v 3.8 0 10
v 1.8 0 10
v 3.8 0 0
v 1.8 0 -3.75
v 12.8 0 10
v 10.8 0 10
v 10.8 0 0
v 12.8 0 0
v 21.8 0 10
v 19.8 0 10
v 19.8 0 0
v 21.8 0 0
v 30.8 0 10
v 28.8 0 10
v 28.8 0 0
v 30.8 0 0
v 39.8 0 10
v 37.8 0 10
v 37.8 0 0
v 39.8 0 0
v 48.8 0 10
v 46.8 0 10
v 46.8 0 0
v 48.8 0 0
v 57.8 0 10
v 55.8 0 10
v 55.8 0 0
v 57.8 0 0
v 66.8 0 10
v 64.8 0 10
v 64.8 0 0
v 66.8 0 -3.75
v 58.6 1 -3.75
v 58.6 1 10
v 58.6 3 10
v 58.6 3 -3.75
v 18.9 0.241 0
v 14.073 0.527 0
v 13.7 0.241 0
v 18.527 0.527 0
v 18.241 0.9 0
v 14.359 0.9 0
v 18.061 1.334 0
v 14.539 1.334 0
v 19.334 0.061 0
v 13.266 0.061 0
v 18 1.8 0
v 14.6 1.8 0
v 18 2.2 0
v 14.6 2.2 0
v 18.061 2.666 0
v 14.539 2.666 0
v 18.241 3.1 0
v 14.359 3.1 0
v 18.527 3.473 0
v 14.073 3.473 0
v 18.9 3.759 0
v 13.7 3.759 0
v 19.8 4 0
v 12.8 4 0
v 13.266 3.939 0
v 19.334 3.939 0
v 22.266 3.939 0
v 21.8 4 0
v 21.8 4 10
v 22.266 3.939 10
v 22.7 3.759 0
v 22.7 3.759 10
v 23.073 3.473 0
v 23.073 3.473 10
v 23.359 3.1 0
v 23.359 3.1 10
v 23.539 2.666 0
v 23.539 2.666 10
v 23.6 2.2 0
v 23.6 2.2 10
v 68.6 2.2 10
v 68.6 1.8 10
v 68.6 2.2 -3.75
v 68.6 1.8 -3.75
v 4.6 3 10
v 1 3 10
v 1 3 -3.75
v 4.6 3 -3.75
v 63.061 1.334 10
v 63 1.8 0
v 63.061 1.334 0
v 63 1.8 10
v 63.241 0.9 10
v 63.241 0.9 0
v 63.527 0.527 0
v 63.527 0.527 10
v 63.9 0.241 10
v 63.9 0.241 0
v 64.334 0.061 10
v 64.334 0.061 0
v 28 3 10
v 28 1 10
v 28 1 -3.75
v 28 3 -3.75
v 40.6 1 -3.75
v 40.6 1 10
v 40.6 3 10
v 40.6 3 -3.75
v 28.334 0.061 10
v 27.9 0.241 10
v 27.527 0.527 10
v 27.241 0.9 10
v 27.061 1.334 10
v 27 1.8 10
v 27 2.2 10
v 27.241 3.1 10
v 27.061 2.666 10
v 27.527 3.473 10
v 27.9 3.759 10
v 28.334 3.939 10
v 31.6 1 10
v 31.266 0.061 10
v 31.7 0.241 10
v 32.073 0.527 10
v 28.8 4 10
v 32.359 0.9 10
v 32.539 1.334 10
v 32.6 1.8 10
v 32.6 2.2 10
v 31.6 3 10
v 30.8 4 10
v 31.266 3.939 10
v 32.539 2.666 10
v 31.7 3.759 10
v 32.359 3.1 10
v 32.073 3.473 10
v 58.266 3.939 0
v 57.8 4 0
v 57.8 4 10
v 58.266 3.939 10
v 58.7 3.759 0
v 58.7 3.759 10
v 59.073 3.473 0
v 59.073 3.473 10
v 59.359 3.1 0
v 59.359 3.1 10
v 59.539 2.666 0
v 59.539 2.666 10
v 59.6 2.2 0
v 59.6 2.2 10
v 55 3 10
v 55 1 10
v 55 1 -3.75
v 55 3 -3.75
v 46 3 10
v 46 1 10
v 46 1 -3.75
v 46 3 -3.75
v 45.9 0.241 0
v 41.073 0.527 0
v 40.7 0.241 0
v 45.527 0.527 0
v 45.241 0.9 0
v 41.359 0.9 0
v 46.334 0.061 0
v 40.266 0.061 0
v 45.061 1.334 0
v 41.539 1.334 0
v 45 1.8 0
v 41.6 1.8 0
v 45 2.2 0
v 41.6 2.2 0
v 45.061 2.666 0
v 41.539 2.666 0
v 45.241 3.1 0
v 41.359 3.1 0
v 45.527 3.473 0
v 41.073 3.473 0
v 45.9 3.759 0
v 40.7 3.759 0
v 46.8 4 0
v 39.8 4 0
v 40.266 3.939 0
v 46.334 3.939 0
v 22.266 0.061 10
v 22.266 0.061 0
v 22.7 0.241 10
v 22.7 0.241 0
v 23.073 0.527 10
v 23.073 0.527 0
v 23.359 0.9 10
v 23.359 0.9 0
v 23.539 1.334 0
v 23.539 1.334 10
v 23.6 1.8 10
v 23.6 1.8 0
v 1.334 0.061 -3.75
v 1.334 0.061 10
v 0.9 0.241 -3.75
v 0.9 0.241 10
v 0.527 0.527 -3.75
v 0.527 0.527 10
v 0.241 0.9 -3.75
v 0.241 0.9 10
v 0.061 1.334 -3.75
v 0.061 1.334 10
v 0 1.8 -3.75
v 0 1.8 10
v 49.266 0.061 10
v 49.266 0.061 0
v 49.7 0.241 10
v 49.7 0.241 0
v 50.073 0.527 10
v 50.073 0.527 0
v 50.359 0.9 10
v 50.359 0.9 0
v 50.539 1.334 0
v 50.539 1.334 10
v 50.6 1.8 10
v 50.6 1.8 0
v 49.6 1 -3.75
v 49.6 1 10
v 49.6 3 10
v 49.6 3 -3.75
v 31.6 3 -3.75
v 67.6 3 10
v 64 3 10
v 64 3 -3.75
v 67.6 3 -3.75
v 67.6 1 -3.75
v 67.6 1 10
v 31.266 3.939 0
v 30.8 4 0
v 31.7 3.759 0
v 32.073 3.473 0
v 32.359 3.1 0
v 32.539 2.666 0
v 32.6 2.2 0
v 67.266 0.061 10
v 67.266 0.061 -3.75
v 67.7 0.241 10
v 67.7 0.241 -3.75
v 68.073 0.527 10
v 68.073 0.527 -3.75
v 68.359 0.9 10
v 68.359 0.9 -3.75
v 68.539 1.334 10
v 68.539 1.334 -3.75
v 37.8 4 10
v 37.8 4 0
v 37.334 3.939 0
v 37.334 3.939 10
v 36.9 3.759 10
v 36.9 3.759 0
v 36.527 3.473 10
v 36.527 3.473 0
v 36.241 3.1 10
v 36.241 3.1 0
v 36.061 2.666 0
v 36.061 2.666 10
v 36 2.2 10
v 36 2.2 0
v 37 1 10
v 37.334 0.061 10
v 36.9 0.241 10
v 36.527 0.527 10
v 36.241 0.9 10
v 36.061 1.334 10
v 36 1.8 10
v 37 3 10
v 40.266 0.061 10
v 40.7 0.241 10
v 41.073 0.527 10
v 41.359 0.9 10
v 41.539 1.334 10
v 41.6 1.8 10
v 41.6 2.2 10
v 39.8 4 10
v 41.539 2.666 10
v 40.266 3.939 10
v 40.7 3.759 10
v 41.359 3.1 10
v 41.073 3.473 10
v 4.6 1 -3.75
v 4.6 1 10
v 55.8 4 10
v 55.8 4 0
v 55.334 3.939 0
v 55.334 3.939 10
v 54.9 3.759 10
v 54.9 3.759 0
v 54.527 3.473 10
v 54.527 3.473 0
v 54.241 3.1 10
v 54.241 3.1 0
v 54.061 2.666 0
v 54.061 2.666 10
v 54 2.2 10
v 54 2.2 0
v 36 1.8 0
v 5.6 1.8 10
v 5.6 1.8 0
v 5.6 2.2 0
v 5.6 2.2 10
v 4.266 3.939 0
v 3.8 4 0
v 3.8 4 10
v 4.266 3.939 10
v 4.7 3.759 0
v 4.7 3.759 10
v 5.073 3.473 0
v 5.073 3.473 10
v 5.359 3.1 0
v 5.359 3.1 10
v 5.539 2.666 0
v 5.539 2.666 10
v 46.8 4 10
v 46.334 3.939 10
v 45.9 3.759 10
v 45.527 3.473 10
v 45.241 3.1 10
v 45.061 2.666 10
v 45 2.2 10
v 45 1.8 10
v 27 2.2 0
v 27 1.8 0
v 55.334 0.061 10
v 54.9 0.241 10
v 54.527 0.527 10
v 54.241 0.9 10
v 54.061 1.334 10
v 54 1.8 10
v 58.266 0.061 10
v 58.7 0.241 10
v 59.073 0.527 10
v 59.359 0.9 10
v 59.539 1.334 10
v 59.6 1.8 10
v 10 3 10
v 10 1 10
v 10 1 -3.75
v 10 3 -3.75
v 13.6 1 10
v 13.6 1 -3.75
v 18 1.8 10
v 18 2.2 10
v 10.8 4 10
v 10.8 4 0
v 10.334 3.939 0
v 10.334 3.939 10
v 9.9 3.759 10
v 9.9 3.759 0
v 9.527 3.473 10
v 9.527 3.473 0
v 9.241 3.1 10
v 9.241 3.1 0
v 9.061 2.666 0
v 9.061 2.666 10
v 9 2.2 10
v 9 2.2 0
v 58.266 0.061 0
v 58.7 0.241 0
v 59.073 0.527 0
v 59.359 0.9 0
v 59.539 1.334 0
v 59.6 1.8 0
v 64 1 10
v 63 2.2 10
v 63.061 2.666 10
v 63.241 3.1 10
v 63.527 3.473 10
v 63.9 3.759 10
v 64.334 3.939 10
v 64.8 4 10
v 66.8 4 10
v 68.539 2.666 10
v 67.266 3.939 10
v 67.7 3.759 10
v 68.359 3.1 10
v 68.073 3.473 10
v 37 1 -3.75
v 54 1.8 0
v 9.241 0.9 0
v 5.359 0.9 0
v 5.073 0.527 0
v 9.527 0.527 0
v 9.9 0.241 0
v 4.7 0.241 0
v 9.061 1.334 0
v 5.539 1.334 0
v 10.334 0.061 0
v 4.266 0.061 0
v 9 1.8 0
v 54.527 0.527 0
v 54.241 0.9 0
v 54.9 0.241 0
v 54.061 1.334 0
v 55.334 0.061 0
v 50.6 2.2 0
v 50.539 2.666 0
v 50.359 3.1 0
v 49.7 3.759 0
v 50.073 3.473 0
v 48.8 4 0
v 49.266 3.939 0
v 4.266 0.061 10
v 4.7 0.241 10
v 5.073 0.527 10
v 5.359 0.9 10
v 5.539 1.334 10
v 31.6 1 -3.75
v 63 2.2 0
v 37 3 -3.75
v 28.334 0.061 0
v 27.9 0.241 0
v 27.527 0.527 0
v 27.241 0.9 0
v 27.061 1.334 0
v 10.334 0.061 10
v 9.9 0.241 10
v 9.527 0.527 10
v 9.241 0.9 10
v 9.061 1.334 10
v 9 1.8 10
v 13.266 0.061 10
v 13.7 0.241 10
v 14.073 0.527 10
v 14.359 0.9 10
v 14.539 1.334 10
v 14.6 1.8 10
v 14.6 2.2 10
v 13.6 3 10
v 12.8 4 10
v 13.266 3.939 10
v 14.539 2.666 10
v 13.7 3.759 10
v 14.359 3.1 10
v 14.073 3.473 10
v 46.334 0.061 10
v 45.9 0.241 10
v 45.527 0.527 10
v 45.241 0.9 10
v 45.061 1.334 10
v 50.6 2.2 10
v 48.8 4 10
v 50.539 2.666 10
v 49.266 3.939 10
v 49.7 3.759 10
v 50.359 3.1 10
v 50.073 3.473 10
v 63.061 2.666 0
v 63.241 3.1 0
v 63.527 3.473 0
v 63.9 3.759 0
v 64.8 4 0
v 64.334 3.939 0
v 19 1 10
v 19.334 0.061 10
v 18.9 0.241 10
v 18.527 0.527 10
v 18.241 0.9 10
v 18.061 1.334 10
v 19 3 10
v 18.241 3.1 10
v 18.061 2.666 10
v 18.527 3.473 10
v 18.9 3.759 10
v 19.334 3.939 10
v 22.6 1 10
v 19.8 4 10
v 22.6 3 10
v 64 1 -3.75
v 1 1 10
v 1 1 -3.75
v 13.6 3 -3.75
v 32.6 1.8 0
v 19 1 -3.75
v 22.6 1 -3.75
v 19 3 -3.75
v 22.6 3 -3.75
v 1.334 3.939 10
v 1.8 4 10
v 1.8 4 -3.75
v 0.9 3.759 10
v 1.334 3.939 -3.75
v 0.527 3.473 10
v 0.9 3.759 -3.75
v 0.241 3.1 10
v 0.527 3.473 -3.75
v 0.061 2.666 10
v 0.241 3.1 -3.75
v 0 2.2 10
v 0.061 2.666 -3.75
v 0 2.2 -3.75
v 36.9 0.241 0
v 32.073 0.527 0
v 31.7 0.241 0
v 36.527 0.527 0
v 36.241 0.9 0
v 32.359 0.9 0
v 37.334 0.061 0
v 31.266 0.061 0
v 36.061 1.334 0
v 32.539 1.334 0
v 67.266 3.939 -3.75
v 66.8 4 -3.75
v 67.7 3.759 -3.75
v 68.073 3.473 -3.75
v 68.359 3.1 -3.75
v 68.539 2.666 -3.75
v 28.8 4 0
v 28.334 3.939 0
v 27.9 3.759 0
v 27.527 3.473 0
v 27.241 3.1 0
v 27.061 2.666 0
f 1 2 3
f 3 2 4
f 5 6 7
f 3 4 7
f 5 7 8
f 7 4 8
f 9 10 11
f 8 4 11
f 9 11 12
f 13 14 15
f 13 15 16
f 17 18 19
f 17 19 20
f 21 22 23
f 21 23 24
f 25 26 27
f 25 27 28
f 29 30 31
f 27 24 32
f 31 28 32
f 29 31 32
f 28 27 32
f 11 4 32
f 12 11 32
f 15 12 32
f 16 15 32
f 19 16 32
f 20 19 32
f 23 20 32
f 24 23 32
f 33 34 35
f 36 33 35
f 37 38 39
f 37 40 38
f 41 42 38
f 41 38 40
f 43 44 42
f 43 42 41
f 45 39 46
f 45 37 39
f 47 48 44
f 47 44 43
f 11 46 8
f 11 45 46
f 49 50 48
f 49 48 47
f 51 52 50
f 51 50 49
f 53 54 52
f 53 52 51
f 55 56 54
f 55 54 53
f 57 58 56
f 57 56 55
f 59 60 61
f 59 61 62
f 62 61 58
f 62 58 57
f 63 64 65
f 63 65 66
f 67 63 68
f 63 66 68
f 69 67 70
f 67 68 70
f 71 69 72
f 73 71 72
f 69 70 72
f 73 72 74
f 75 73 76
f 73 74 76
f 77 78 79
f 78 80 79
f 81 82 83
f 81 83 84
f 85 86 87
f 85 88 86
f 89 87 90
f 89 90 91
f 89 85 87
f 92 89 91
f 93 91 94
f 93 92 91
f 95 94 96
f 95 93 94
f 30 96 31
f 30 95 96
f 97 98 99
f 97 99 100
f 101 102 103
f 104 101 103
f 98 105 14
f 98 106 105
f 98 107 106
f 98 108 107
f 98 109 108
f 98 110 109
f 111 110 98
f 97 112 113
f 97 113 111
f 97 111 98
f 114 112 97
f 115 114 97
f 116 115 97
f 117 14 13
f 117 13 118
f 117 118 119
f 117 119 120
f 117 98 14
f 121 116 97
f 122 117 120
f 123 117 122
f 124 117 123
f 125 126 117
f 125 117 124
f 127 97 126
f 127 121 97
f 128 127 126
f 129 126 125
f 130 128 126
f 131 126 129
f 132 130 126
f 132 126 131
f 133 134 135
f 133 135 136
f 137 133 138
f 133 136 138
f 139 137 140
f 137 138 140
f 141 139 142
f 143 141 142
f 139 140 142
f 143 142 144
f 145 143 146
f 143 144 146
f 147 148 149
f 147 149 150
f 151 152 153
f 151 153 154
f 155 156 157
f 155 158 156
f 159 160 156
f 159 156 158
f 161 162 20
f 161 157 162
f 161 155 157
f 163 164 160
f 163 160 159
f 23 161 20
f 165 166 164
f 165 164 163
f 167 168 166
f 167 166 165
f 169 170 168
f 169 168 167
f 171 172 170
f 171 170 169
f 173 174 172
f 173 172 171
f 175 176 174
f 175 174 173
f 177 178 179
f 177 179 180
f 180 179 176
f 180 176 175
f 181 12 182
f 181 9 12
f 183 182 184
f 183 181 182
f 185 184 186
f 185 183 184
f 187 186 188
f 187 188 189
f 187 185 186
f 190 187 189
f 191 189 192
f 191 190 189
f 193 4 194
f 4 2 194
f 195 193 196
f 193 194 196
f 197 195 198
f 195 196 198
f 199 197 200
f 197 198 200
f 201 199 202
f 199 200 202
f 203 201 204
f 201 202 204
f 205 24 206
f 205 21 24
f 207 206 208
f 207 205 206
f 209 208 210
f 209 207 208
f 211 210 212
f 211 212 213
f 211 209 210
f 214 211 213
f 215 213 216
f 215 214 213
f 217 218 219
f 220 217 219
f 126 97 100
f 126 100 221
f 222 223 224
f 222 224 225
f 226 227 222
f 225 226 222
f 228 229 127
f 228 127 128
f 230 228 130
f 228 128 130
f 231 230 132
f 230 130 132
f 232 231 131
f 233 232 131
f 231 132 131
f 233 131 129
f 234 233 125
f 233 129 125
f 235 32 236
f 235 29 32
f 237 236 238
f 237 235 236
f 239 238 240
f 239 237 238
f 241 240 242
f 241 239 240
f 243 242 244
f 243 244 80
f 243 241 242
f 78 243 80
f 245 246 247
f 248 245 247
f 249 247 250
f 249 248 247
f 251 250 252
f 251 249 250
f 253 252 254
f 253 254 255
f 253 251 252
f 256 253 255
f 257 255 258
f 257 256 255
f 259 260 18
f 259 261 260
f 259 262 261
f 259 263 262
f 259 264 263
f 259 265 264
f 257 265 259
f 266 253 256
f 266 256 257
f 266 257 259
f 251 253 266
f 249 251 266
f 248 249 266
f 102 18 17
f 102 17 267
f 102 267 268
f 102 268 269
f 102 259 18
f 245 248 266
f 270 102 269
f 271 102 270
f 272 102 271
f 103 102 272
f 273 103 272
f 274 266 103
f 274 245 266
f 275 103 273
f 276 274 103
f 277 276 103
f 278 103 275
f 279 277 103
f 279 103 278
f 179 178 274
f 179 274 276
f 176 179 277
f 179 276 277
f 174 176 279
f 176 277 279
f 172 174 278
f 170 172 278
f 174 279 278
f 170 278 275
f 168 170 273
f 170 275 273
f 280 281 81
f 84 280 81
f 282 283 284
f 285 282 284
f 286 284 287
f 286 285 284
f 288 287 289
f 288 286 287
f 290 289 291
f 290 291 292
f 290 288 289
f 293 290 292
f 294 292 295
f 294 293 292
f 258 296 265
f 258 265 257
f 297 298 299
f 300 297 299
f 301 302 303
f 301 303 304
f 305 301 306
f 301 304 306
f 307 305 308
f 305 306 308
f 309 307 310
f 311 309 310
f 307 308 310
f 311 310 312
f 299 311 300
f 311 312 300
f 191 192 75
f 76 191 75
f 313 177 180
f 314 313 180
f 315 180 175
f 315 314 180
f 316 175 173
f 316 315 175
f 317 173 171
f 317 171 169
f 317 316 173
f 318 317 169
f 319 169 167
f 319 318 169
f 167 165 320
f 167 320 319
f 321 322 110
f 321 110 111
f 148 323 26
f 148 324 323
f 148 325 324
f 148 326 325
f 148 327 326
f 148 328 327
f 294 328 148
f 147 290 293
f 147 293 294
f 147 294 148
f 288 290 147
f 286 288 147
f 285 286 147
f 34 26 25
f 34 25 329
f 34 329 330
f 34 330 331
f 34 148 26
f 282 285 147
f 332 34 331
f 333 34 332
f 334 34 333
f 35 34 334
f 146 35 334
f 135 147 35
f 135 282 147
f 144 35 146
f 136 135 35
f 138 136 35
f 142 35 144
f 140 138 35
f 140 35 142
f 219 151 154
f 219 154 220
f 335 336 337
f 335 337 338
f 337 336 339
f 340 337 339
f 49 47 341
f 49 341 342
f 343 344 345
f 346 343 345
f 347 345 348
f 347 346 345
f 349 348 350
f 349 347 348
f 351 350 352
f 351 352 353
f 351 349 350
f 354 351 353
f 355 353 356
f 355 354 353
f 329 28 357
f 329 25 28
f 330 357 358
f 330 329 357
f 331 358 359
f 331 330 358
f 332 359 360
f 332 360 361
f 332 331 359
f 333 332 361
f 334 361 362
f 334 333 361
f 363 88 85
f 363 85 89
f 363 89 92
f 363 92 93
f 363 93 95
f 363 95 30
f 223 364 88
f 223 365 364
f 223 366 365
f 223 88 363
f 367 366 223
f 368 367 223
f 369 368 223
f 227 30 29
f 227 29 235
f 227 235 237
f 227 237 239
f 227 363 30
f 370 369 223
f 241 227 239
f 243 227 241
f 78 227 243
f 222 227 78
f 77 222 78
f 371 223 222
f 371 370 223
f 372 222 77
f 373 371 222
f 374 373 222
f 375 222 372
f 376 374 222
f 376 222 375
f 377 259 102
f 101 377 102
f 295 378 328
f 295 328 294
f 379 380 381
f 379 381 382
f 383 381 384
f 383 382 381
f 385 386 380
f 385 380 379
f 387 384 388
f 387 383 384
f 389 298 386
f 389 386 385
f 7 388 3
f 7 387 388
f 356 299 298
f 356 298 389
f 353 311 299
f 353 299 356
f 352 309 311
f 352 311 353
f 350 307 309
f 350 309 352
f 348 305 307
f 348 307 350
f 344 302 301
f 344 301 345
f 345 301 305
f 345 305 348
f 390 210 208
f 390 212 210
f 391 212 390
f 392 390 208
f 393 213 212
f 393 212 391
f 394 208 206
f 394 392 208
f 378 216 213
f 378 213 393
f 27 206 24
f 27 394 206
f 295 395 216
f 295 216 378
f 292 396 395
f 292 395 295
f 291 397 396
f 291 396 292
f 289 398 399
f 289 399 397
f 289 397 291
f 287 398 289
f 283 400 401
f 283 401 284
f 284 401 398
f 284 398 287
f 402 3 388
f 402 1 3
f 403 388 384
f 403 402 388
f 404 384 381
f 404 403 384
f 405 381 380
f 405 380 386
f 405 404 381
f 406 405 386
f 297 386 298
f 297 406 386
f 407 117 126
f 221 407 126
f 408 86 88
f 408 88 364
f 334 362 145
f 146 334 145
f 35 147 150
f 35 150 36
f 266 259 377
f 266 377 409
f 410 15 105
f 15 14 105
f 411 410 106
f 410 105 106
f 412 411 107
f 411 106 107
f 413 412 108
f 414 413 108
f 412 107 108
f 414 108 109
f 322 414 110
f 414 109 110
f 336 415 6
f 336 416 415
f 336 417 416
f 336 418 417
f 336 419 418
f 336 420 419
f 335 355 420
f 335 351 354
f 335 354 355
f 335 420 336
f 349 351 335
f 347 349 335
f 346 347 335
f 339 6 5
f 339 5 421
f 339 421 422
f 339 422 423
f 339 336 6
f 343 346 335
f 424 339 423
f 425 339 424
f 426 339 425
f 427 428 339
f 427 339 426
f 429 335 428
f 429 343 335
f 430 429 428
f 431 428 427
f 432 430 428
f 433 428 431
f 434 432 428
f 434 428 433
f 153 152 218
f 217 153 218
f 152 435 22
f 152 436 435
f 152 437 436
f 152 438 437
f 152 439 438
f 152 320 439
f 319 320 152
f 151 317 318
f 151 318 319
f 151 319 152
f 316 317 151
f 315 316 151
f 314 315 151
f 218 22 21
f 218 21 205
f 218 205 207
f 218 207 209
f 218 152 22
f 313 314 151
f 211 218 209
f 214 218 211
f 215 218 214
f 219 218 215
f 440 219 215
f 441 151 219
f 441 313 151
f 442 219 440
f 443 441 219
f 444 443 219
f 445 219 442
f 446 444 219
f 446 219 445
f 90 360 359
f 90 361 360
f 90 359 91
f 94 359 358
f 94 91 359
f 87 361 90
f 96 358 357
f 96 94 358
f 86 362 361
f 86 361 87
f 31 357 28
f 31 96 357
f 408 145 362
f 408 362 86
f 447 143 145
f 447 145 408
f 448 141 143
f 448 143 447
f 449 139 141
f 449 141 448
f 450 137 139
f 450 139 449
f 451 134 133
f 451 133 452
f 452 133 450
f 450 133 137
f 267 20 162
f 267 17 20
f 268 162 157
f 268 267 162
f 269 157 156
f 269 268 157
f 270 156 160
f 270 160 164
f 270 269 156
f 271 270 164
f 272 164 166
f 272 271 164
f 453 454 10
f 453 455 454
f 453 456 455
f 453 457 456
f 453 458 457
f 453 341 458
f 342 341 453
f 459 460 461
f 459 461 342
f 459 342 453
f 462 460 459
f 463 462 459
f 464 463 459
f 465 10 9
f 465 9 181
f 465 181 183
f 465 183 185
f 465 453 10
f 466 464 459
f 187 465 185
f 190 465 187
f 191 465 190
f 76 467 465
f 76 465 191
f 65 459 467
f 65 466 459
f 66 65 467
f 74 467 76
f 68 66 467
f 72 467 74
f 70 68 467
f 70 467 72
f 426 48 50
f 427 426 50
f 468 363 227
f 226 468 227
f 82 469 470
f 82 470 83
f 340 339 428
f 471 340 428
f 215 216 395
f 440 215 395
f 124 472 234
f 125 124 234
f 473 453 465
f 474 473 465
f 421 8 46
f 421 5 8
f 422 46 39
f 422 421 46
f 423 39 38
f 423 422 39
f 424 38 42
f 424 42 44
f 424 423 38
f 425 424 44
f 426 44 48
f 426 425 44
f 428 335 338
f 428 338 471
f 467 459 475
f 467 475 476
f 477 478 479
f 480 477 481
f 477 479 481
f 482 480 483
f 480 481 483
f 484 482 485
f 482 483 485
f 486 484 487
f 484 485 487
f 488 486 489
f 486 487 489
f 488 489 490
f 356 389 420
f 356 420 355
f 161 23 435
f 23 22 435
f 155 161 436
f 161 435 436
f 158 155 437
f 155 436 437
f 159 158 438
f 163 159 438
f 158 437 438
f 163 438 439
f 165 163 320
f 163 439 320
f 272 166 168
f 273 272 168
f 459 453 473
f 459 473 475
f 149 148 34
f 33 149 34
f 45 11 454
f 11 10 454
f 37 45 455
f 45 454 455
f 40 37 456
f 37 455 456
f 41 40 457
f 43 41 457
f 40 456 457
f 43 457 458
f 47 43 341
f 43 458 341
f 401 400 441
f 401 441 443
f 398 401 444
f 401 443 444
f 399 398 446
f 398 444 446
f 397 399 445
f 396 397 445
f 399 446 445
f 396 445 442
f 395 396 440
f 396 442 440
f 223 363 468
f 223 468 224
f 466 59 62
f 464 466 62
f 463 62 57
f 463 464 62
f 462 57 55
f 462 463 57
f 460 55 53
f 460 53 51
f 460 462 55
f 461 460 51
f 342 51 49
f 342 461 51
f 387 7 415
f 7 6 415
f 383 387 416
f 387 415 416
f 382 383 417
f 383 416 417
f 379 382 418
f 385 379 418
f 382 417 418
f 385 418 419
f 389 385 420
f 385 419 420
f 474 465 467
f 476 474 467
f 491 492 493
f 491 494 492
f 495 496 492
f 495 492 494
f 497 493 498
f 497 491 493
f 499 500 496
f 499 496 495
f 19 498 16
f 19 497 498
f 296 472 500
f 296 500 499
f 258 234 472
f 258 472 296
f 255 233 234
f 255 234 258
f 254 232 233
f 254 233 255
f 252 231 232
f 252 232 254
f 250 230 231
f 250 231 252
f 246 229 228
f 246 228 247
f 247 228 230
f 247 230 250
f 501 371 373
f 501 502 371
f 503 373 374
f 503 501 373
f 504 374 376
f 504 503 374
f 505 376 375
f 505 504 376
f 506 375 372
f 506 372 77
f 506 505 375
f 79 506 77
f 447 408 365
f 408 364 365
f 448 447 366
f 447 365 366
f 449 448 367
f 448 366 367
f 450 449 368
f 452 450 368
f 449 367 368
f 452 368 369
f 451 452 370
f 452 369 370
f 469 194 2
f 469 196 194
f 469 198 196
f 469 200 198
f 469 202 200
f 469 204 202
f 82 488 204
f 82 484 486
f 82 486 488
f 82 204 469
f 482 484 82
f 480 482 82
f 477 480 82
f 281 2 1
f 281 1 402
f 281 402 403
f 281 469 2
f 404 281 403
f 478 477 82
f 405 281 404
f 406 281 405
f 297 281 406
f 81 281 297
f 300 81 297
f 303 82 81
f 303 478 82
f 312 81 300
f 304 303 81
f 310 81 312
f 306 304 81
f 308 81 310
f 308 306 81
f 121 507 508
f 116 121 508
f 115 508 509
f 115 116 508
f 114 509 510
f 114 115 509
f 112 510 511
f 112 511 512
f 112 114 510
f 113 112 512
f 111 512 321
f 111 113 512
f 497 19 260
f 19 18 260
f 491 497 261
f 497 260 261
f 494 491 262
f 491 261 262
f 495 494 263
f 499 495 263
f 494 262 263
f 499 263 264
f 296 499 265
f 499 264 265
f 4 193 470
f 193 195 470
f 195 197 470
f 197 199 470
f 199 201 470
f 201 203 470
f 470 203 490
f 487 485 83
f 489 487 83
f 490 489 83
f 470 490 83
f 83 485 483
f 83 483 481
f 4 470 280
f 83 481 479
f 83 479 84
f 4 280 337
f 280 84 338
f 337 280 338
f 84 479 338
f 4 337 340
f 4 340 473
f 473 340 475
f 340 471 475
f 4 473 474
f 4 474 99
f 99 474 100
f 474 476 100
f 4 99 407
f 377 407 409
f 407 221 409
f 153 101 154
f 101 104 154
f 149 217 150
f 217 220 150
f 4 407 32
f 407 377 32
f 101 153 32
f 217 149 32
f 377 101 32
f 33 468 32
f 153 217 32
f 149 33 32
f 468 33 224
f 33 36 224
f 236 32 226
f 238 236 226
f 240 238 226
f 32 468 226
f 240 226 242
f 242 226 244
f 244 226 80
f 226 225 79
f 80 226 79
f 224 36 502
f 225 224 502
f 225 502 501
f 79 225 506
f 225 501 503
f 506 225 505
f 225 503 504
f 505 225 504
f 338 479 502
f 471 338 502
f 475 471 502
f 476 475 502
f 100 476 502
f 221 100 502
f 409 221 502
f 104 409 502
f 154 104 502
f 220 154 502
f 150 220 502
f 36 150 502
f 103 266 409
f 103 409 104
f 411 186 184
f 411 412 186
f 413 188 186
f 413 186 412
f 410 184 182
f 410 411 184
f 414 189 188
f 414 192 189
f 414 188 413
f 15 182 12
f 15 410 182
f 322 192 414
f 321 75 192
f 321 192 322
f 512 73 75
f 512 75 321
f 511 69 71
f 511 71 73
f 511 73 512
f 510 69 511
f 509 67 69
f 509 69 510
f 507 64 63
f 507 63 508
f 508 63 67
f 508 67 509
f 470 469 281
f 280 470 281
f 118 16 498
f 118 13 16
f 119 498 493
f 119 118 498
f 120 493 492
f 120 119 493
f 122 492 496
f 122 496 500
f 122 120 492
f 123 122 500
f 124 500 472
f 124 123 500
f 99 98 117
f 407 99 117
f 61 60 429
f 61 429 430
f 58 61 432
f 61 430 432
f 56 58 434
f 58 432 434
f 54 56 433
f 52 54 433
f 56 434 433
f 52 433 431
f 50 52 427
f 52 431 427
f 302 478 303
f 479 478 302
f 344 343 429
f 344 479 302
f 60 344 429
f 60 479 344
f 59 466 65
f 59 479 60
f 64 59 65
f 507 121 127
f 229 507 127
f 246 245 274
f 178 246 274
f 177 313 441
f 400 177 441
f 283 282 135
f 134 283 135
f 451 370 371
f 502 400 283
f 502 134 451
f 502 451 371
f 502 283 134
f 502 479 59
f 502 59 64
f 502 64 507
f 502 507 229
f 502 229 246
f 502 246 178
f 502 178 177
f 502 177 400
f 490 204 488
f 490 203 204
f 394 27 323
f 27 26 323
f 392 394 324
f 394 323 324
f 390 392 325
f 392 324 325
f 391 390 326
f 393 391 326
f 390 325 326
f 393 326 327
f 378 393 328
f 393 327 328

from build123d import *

# Parameters (mm, degrees)
SKETCH008_W     = 68.6
SKETCH008_H     = 4
PAD_DEPTH       = 3.75
SKETCH_W        = 5.6
SKETCH_H        = 4
PAD001_DEPTH    = 10
SKETCH001_W     = 5.6
SKETCH001_H     = 4
PAD002_DEPTH    = 10
SKETCH002_W     = 5.6
SKETCH002_H     = 4
PAD003_DEPTH    = 10
SKETCH003_W     = 5.6
SKETCH003_H     = 4
PAD004_DEPTH    = 10
SKETCH004_W     = 5.6
SKETCH004_H     = 4
PAD005_DEPTH    = 10
SKETCH005_W     = 5.6
SKETCH005_H     = 4
PAD006_DEPTH    = 10
SKETCH006_W     = 5.6
SKETCH006_H     = 4
PAD007_DEPTH    = 10
SKETCH007_W     = 5.6
SKETCH007_H     = 4
PAD008_DEPTH    = 10
SKETCH009_W     = 3.6
SKETCH009_H     = 2
POCKET_DEPTH    = 13.75
SKETCH010_W     = 3.6
SKETCH010_H     = 2
POCKET001_DEPTH = 13.75
SKETCH011_W     = 3.6
SKETCH011_H     = 2
POCKET002_DEPTH = 13.75
SKETCH012_W     = 3.6
SKETCH012_H     = 2
POCKET003_DEPTH = 13.75
SKETCH013_W     = 3.6
SKETCH013_H     = 2
POCKET004_DEPTH = 13.75
SKETCH014_W     = 3.6
SKETCH014_H     = 2
POCKET005_DEPTH = 13.75
SKETCH015_W     = 3.6
SKETCH015_H     = 2
POCKET006_DEPTH = 13.75
SKETCH016_W     = 3.6
SKETCH016_H     = 2
POCKET007_DEPTH = 13.75
FILLET_R        = 1.8


with BuildPart() as part:
    # Sketch008 → Pad (new body)
    with BuildSketch(Plane.XY):
        with Locations((34.3, 2)):
            Rectangle(SKETCH008_W, SKETCH008_H)
    extrude(amount=-PAD_DEPTH)

    # Sketch → Pad001 (join)
    with BuildSketch(Plane.XY):
        with Locations((2.8, 2)):
            Rectangle(SKETCH_W, SKETCH_H)
    extrude(amount=PAD001_DEPTH)

    # Sketch001 → Pad002 (join)
    with BuildSketch(Plane.XY):
        with Locations((11.8, 2)):
            Rectangle(SKETCH001_W, SKETCH001_H)
    extrude(amount=PAD002_DEPTH)

    # Sketch002 → Pad003 (join)
    with BuildSketch(Plane.XY):
        with Locations((20.8, 2)):
            Rectangle(SKETCH002_W, SKETCH002_H)
    extrude(amount=PAD003_DEPTH)

    # Sketch003 → Pad004 (join)
    with BuildSketch(Plane.XY):
        with Locations((29.8, 2)):
            Rectangle(SKETCH003_W, SKETCH003_H)
    extrude(amount=PAD004_DEPTH)

    # Sketch004 → Pad005 (join)
    with BuildSketch(Plane.XY):
        with Locations((38.8, 2)):
            Rectangle(SKETCH004_W, SKETCH004_H)
    extrude(amount=PAD005_DEPTH)

    # Sketch005 → Pad006 (join)
    with BuildSketch(Plane.XY):
        with Locations((47.8, 2)):
            Rectangle(SKETCH005_W, SKETCH005_H)
    extrude(amount=PAD006_DEPTH)

    # Sketch006 → Pad007 (join)
    with BuildSketch(Plane.XY):
        with Locations((56.8, 2)):
            Rectangle(SKETCH006_W, SKETCH006_H)
    extrude(amount=PAD007_DEPTH)

    # Sketch007 → Pad008 (join)
    with BuildSketch(Plane.XY):
        with Locations((65.8, 2)):
            Rectangle(SKETCH007_W, SKETCH007_H)
    extrude(amount=PAD008_DEPTH)

    # Sketch009 (on Face24 of Pad008) → Pocket (cut)
    with BuildSketch(Plane.XY.offset(10)):
        with Locations((2.8, 2)):
            Rectangle(SKETCH009_W, SKETCH009_H)
    extrude(amount=-POCKET_DEPTH, mode=Mode.SUBTRACT)

    # Sketch010 (on Face27 of Pad008) → Pocket001 (cut)
    with BuildSketch(Plane.XY.offset(10)):
        with Locations((11.8, 2)):
            Rectangle(SKETCH010_W, SKETCH010_H)
    extrude(amount=-POCKET001_DEPTH, mode=Mode.SUBTRACT)

    # Sketch011 (on Face30 of Pad008) → Pocket002 (cut)
    with BuildSketch(Plane.XY.offset(10)):
        with Locations((20.8, 2)):
            Rectangle(SKETCH011_W, SKETCH011_H)
    extrude(amount=-POCKET002_DEPTH, mode=Mode.SUBTRACT)

    # Sketch012 (on Face33 of Pad008) → Pocket003 (cut)
    with BuildSketch(Plane.XY.offset(10)):
        with Locations((29.8, 2)):
            Rectangle(SKETCH012_W, SKETCH012_H)
    extrude(amount=-POCKET003_DEPTH, mode=Mode.SUBTRACT)

    # Sketch013 (on Face36 of Pad008) → Pocket004 (cut)
    with BuildSketch(Plane.XY.offset(10)):
        with Locations((38.8, 2)):
            Rectangle(SKETCH013_W, SKETCH013_H)
    extrude(amount=-POCKET004_DEPTH, mode=Mode.SUBTRACT)

    # Sketch014 (on Face39 of Pad008) → Pocket005 (cut)
    with BuildSketch(Plane.XY.offset(10)):
        with Locations((47.8, 2)):
            Rectangle(SKETCH014_W, SKETCH014_H)
    extrude(amount=-POCKET005_DEPTH, mode=Mode.SUBTRACT)

    # Sketch015 (on Face42 of Pad008) → Pocket006 (cut)
    with BuildSketch(Plane.XY.offset(10)):
        with Locations((56.8, 2)):
            Rectangle(SKETCH015_W, SKETCH015_H)
    extrude(amount=-POCKET006_DEPTH, mode=Mode.SUBTRACT)

    # Sketch016 (on Face44 of Pad008) → Pocket007 (cut)
    with BuildSketch(Plane.XY.offset(10)):
        with Locations((65.8, 2)):
            Rectangle(SKETCH016_W, SKETCH016_H)
    extrude(amount=-POCKET007_DEPTH, mode=Mode.SUBTRACT)

    # Fillet
    fillet_edges = [part.edges().sort_by_distance(p)[0] for p in [
        (0, 4, 5),
        (0, 0, 5),
        (5.6, 4, 5),
        (5.6, 0, 5),
        (9, 0, 5),
        (9, 4, 5),
        (14.6, 4, 5),
        (14.6, 0, 5),
        (18, 4, 5),
        (18, 0, 5),
        (23.6, 4, 5),
        (23.6, 0, 5),
        (27, 4, 5),
        (27, 0, 5),
        (32.6, 4, 5),
        (32.6, 0, 5),
        (36, 4, 5),
        (41.6, 4, 5),
        (36, 0, 5),
        (41.6, 0, 5),
        (45, 4, 5),
        (45, 0, 5),
        (50.6, 0, 5),
        (50.6, 4, 5),
        (54, 4, 5),
        (59.6, 4, 5),
        (59.6, 0, 5),
        (54, 0, 5),
        (63, 4, 5),
        (63, 0, 5),
        (68.6, 0, 5),
        (68.6, 4, 5),
    ]]
    fillet(fillet_edges, radius=FILLET_R)


solid = part.part
